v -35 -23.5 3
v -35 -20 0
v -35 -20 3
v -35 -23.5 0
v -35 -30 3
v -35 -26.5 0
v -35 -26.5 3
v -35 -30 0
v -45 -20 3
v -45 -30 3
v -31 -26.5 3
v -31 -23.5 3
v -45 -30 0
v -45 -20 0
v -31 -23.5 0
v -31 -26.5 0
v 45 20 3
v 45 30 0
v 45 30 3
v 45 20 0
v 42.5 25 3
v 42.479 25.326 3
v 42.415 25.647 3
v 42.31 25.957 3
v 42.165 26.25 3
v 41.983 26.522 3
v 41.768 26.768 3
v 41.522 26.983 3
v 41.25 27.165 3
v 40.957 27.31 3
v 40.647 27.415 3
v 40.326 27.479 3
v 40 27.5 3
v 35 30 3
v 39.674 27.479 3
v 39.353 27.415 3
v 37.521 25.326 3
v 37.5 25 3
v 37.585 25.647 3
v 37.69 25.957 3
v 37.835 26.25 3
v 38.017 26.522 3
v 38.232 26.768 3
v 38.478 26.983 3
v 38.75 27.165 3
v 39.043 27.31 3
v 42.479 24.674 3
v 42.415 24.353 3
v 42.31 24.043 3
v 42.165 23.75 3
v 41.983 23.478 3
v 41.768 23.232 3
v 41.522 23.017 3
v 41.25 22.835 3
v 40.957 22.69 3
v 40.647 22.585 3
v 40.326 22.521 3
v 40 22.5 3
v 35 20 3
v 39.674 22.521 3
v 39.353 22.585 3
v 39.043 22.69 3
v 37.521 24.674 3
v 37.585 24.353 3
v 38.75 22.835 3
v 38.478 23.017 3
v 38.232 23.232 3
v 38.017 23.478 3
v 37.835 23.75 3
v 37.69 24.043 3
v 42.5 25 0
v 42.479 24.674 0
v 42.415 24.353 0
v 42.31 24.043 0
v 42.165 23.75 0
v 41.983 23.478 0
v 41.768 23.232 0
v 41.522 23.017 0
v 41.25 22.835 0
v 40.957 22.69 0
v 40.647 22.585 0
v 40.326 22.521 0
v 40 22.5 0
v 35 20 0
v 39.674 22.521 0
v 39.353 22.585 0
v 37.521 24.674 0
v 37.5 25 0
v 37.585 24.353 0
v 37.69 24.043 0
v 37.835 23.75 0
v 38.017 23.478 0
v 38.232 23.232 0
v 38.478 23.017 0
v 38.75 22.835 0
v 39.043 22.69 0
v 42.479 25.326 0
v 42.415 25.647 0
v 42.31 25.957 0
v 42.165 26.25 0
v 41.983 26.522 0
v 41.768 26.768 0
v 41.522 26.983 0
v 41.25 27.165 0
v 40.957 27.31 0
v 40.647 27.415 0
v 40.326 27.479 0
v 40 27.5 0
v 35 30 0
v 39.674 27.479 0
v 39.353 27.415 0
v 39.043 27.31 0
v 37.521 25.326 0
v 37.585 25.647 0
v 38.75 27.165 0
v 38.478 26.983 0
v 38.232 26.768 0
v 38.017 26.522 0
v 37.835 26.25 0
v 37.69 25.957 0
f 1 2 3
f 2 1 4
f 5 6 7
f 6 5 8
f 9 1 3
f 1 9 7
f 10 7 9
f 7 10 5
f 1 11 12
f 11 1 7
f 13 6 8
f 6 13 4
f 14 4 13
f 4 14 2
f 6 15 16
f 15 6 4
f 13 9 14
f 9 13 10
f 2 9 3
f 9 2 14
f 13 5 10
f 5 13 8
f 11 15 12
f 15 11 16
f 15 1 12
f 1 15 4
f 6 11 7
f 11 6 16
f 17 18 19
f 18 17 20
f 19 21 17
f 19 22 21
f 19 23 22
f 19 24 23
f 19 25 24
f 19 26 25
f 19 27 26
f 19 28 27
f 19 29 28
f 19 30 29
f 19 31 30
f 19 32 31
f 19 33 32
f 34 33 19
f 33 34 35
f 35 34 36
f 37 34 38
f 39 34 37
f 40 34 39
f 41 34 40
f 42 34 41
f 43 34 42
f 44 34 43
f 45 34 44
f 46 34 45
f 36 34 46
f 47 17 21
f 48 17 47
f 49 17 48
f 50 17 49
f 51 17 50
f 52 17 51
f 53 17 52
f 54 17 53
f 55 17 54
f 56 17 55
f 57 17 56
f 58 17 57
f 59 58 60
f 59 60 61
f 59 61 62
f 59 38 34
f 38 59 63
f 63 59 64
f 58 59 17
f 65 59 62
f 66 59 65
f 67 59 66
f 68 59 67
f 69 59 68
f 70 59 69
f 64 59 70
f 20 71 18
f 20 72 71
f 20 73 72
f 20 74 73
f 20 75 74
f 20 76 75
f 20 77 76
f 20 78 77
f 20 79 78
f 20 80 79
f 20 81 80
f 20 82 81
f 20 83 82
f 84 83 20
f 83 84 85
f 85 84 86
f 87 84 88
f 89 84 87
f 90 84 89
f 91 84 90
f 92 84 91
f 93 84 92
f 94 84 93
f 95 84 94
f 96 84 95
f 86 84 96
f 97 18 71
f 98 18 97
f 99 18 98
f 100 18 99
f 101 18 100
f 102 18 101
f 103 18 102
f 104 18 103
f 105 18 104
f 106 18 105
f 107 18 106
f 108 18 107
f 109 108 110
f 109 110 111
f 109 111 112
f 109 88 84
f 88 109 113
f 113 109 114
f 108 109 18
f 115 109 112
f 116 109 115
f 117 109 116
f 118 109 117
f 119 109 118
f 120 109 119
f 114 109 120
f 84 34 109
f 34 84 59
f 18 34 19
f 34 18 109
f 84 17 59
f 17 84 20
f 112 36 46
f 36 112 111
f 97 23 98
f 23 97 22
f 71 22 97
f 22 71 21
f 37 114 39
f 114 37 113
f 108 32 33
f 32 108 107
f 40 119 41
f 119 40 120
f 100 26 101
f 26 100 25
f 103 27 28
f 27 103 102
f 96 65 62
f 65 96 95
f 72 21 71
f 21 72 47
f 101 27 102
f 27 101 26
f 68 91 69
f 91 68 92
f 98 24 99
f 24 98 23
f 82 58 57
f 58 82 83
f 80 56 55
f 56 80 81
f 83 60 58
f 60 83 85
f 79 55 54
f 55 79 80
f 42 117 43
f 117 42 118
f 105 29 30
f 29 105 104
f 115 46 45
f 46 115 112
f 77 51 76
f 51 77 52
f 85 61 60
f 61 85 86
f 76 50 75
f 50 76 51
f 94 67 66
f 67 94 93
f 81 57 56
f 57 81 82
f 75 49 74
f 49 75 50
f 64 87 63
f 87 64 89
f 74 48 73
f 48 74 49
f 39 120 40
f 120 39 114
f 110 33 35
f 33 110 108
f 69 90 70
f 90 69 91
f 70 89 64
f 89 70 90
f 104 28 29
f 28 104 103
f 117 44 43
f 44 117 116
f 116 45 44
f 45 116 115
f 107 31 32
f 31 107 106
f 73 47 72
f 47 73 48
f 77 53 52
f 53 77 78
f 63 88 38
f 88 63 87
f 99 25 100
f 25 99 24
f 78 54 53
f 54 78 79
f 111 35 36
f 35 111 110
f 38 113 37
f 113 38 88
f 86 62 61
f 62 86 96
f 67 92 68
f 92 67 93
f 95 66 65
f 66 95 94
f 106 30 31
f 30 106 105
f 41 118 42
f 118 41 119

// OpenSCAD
// CHITUBOX が STL の座標をそのまま使うかどうかの試験片 ── 2026-08-31
// ============================================================
// 🔴 何のための物か
//   「刷るぞー」（印刷ターム単位で並べて、配置済みの STL を書き出すローカルアプリ）の
//   設計が、前提を 1 つ抱えている。**CHITUBOX が読み込んだ STL の座標を尊重するか、
//   勝手にプレート中央へ寄せるか。**
//   寄せられるなら「配置済み STL を出す」という出力形式そのものが成立しないので、
//   何かを書き始める前にここを潰す。
//
//   ⚠ これは刷る物ではない。**読み込んで位置を見るだけ**の物である。
//
// ------------------------------------------------------------
// 使い方（2 分）
// ------------------------------------------------------------
//   1. CHITUBOX に **A と B の 2 つを読み込む**（1 つずつでよい）
//   2. 下の「期待される位置」どおりに離れて出るかを見る
//   3. どうなったかだけ教えてもらえれば足りる
//
//   ⚠ 読み込み時に自動配置する設定があれば、**切った状態でも試すこと。**
//     既定で寄る場合でも、切れるなら設計は成立する。
//
// ------------------------------------------------------------
// 期待される位置（Mars 3 のプレートは 143 x 89mm・中心を原点とみなす）
// ------------------------------------------------------------
//   A … 中心が (-40, -25)。**+X 側に爪が 1 つ出ている**（向きの確認用）
//   B … 中心が (+40, +25)。**真ん中に穴が開いている**
//
//   ⇒ 2 つの中心の距離は X で 80.0、Y で 50.0。
//   ⇒ どちらも **Z=0 に接地**している（高さ 3.0）。
//
//   読める結果は 3 通り:
//     ✅ 離れたまま出る          → 座標は尊重される。設計はこのまま進む
//     ❌ 2 つが重なる／中央に来る → 1 つずつ中央へ寄せられている。**出力形式を変える**
//                                  （1 つの STL に結合して出すしかない）
//     ⚠ 離れているが位置が違う   → 原点の取り方が違う。オフセットを測って合わせる
//
// ------------------------------------------------------------
// 焼き方
// ------------------------------------------------------------
//   openscad --backend=manifold -D 'part="a"' -o stl/test/coord_test_a.stl hardware/chitubox_coord_test.scad
//   openscad --backend=manifold -D 'part="b"' -o stl/test/coord_test_b.stl hardware/chitubox_coord_test.scad
// ============================================================
$fn = 48;

// part の値: "a" / "b" / "both"（both は目で見て確かめる用。書き出さない）
part = "both";

BOX   = 10.0;   // 一辺
T     =  3.0;   // 高さ
AX    = -40.0;  // A の中心
AY    = -25.0;
BX    =  40.0;  // B の中心
BY    =  25.0;

// A ── +X 側に爪。向きが変わったら爪の向きで分かる
module piece_a() {
    translate([AX, AY, 0]) {
        translate([-BOX/2, -BOX/2, 0]) cube([BOX, BOX, T]);
        translate([BOX/2, -1.5, 0]) cube([4.0, 3.0, T]);   // 爪
    }
}

// B ── 真ん中に穴。A と取り違えないように形を変えてある
module piece_b() {
    translate([BX, BY, 0])
        difference() {
            translate([-BOX/2, -BOX/2, 0]) cube([BOX, BOX, T]);
            translate([0, 0, -1]) cylinder(d = 5.0, h = T + 2);
        }
}

if (part == "a")         piece_a();
else if (part == "b")    piece_b();
else                   { piece_a(); piece_b(); }
